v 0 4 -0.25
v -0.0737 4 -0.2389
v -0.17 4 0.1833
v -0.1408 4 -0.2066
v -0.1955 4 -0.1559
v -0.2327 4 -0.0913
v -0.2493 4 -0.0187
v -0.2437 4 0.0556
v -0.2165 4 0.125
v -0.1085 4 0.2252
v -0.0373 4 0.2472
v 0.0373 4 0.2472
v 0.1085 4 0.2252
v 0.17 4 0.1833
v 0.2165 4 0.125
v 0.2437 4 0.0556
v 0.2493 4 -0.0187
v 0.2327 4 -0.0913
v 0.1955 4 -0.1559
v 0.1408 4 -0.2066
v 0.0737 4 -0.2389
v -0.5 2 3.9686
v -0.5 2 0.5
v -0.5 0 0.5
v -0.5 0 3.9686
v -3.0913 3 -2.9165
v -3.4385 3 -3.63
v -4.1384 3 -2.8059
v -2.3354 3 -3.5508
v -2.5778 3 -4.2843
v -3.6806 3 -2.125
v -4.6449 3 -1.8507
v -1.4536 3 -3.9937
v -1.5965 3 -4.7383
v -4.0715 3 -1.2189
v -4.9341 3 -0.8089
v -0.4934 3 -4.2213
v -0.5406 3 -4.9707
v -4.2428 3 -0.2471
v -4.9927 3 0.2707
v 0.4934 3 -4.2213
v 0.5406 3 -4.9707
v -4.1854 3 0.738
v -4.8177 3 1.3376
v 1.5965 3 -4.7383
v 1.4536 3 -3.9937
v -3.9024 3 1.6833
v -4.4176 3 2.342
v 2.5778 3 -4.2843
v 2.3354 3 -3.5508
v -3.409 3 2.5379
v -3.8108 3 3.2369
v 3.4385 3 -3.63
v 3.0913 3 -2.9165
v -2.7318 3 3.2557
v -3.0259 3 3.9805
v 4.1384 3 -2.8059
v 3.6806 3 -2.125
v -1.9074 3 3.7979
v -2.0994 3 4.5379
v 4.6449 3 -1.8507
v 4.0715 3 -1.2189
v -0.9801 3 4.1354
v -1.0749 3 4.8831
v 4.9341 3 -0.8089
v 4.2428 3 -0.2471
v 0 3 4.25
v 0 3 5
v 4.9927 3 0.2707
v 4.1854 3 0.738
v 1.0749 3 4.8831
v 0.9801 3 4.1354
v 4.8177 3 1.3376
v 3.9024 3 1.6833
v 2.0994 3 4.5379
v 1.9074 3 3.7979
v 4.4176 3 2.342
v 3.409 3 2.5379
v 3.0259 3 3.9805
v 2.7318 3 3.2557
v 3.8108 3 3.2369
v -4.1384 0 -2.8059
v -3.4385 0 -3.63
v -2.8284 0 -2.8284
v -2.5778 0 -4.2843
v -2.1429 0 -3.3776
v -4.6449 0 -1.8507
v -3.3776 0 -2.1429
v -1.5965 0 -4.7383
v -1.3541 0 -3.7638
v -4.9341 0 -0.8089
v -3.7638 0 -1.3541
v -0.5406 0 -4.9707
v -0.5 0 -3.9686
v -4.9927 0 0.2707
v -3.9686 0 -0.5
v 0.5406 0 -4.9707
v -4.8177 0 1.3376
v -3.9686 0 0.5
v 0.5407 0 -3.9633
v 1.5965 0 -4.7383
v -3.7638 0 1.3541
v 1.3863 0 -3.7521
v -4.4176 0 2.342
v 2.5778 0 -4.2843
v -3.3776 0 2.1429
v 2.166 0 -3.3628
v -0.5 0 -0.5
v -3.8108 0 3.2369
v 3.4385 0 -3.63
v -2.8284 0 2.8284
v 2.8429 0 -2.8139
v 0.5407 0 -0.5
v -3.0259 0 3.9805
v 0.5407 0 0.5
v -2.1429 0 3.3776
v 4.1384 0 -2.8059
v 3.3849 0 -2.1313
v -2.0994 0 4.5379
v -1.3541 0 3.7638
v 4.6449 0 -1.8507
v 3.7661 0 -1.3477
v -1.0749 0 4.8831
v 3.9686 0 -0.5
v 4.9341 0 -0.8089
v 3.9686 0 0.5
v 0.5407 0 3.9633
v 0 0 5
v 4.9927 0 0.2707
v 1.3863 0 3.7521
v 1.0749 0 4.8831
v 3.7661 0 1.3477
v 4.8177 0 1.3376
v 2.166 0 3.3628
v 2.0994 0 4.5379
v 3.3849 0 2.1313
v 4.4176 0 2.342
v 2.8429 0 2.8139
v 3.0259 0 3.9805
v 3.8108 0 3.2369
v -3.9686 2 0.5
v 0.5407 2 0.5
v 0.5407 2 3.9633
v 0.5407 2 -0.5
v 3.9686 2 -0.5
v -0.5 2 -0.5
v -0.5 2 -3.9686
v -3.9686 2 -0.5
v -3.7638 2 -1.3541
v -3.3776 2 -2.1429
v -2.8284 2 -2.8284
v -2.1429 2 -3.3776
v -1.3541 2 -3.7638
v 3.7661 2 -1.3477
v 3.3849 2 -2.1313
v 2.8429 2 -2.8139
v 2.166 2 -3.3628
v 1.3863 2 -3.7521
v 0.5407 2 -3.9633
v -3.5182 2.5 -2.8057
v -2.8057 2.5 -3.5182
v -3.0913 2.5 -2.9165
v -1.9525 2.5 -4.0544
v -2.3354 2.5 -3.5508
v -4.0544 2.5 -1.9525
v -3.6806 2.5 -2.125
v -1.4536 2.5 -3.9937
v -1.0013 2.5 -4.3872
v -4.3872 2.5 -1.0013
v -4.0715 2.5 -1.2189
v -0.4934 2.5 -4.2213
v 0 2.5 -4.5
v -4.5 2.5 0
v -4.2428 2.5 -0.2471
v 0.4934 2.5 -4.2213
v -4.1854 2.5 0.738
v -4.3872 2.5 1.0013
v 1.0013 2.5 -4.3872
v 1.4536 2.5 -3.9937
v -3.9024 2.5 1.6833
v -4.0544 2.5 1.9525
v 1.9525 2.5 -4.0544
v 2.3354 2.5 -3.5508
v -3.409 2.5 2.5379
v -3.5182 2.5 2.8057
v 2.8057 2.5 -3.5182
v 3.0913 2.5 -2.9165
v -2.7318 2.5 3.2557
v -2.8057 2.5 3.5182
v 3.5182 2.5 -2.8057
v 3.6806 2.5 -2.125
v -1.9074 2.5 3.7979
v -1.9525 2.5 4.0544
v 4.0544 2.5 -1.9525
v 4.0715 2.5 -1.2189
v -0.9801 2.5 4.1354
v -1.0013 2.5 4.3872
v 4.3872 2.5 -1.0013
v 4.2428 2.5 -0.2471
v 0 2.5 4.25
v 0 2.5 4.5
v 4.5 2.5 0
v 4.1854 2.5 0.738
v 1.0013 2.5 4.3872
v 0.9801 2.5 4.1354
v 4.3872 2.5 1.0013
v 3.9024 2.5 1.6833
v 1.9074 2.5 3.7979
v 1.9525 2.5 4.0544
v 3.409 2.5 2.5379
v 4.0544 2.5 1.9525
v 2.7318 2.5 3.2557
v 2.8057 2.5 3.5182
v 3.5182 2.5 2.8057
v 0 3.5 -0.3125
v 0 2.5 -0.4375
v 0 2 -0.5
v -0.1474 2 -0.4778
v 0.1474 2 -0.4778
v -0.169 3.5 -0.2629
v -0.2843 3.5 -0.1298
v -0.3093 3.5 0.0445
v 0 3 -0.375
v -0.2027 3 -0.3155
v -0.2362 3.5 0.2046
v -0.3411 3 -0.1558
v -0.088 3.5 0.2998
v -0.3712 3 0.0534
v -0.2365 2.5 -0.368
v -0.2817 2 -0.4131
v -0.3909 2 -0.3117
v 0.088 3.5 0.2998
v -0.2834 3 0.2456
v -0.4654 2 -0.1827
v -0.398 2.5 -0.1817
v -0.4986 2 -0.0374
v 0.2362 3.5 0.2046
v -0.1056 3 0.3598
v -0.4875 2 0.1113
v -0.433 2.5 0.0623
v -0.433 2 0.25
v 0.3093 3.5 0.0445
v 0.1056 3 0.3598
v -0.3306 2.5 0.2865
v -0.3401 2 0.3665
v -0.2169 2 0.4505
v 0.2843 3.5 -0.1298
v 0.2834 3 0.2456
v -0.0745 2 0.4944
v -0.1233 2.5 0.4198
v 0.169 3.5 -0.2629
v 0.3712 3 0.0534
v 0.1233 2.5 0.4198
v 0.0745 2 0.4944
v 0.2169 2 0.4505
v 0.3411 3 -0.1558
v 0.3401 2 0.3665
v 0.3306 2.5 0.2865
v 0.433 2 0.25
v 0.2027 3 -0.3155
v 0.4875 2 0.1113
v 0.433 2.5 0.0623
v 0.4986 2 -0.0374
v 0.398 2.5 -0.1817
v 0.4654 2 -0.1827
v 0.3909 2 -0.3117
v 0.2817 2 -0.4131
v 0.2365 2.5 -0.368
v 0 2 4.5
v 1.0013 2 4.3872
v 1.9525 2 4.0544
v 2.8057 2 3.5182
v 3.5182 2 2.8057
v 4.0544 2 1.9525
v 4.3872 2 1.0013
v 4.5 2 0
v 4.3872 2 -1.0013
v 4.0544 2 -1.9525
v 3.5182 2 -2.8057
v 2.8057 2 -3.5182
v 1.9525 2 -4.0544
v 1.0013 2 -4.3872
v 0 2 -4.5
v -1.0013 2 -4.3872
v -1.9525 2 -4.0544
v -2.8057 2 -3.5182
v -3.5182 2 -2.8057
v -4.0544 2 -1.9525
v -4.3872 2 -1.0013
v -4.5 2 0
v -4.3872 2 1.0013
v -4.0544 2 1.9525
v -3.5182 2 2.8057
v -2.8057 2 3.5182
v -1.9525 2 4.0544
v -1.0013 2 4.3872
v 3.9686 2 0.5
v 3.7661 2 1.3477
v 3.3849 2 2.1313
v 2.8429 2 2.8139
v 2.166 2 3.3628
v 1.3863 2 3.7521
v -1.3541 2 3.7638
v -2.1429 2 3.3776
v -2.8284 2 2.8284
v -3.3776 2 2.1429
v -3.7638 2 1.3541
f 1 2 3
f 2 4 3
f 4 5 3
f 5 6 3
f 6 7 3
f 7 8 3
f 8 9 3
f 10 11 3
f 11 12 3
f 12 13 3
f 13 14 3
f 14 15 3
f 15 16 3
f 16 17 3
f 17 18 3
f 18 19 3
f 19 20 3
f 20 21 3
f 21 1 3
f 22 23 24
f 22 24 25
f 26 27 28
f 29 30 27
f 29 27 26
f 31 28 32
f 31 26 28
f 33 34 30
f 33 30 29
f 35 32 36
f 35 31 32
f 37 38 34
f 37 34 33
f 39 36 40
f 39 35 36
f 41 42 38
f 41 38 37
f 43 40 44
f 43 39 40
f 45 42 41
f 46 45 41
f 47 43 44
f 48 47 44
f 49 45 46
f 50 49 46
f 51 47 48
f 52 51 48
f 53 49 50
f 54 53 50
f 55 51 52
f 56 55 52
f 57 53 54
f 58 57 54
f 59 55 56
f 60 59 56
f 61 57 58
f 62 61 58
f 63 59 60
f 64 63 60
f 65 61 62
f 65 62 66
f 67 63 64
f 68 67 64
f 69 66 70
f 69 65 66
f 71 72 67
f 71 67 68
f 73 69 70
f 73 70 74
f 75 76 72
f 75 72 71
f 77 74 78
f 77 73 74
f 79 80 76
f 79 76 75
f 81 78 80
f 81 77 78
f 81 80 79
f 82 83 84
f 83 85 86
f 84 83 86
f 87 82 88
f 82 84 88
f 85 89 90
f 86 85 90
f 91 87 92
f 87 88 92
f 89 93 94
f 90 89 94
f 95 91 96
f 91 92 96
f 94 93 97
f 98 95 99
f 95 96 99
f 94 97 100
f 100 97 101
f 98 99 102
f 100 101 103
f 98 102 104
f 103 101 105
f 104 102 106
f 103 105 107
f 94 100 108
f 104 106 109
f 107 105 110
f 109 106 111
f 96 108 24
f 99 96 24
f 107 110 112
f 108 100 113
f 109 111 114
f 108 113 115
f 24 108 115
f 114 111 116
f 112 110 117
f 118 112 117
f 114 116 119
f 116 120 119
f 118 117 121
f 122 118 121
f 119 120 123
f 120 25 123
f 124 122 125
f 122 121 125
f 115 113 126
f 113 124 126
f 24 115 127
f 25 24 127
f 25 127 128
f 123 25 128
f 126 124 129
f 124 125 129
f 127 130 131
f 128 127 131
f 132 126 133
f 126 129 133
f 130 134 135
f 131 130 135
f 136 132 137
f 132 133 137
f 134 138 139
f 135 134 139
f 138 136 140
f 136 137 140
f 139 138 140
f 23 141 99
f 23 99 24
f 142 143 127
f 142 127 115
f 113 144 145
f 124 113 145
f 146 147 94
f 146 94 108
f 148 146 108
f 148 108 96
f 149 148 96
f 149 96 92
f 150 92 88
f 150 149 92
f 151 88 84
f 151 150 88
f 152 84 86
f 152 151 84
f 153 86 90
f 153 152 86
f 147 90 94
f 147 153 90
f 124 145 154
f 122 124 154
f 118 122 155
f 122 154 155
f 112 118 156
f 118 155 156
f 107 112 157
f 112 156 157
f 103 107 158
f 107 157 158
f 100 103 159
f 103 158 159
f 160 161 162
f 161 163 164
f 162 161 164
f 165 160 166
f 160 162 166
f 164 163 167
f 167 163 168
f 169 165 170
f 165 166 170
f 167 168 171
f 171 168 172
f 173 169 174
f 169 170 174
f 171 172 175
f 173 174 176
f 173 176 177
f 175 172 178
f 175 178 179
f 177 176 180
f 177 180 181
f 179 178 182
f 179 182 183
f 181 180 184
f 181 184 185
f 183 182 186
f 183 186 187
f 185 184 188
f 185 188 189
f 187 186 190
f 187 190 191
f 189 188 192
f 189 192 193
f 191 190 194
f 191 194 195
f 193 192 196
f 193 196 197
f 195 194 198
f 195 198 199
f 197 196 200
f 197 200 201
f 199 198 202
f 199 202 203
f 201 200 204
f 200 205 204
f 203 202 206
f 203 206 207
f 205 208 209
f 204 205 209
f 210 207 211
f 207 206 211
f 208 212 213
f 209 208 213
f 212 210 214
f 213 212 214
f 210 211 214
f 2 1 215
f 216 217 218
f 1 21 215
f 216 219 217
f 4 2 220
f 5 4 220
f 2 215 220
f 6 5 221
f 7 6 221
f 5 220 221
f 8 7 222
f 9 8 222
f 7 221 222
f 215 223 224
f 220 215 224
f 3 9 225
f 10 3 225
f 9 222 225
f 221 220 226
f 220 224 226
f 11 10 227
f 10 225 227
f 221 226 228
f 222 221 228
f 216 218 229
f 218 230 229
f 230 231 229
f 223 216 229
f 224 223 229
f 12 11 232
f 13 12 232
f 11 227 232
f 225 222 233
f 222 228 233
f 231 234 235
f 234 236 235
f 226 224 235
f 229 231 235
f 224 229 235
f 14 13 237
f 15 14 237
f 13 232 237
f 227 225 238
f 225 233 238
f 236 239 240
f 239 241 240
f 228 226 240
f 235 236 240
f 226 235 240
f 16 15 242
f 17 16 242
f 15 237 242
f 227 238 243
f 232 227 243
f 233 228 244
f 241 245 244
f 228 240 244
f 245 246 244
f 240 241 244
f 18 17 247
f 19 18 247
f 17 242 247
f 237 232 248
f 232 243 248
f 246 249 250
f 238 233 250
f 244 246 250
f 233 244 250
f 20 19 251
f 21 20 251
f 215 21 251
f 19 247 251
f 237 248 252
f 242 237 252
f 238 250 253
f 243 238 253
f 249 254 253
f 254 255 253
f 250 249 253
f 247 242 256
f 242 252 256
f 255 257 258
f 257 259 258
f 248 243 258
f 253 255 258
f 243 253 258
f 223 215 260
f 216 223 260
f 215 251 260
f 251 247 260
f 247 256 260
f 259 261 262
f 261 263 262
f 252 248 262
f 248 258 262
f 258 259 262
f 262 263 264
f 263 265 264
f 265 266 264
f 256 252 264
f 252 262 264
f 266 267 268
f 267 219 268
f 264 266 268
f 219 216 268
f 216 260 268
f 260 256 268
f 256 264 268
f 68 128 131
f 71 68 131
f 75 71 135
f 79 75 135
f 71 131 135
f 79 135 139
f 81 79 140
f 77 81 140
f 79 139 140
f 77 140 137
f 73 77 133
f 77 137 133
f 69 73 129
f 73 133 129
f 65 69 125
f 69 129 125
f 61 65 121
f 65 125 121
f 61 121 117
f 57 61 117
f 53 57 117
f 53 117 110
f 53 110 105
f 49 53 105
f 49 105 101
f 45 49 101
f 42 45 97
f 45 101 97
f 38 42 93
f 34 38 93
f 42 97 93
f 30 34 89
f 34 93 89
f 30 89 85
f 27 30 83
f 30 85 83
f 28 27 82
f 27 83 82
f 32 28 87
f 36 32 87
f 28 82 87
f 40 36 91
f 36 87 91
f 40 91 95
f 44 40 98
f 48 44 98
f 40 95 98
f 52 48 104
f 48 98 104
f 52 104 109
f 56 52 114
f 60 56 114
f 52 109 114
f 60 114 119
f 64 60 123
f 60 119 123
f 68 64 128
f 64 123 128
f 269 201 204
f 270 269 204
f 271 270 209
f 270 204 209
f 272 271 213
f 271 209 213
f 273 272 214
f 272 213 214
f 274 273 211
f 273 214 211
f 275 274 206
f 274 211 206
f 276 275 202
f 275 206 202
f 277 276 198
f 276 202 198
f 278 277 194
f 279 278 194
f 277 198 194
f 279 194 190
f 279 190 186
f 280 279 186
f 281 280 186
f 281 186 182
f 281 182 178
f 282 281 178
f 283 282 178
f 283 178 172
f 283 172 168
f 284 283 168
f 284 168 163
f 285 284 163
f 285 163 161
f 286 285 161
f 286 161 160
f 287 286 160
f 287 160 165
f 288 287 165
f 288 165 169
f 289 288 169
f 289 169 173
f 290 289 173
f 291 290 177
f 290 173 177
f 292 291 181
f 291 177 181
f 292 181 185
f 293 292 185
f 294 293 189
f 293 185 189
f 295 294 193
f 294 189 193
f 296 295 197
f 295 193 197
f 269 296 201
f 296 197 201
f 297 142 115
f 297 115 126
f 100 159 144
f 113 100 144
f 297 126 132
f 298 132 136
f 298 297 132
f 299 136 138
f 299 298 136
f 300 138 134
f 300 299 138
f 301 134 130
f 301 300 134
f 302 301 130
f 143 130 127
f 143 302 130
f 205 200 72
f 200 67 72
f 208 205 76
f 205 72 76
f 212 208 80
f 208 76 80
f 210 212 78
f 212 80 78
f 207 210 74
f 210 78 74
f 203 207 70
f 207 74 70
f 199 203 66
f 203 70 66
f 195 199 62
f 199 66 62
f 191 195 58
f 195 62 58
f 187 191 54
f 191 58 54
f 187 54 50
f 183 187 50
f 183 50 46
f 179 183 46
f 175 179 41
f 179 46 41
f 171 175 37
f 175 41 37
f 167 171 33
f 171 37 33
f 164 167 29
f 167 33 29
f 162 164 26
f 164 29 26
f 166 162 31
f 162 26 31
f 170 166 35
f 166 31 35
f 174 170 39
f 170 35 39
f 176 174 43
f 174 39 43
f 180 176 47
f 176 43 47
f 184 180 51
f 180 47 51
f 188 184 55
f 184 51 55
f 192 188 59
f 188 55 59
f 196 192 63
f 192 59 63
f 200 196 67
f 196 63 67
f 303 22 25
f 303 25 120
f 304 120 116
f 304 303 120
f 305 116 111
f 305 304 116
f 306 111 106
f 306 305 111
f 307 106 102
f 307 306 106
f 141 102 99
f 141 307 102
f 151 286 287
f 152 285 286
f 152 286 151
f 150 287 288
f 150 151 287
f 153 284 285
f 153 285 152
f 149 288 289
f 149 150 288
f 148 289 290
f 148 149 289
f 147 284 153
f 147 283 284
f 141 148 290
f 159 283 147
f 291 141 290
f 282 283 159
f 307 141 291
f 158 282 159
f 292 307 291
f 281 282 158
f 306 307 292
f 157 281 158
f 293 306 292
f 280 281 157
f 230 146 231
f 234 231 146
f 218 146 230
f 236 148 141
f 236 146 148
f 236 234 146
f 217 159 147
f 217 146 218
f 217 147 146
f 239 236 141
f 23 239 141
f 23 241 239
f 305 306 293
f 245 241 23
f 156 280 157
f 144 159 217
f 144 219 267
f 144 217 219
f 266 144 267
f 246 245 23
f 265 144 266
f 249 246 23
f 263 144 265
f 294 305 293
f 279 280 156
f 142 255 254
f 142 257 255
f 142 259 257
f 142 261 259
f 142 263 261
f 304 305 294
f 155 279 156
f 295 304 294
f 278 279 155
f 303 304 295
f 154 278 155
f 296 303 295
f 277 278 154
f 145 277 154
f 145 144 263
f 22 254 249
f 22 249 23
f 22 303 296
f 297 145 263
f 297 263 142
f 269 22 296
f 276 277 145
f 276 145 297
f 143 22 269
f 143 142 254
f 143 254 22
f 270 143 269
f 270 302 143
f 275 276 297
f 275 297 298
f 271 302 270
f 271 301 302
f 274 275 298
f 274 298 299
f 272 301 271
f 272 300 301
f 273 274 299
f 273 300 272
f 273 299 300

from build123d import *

# Parameters (mm, degrees)
SKETCH1_R           = 5
BOSS_EXTRUDE1_DEPTH = 3
CUT_EXTRUDE1_DEPTH  = 3
SKETCH3_R           = 4.5
CUT_EXTRUDE2_DEPTH  = 1
SKETCH27_W          = 0.25
SKETCH27_H          = 0.5


with BuildPart() as part:
    # Sketch1 → Boss-Extrude1 (new body)
    with BuildSketch(Plane(origin=(0, 0, 0), x_dir=(1, 0, 0), z_dir=(0, 1, 0))):
        with Locations(Location((0, 0, 0), (0, 0, 270))):
            Circle(SKETCH1_R)
    extrude(amount=BOSS_EXTRUDE1_DEPTH)

    # Sketch2 → Cut-Extrude1 (cut)
    with BuildSketch(Plane(origin=(0, 3, 0), x_dir=(1, 0, 0), z_dir=(0, 1, 0))):
        with BuildLine():
            ThreePointArc((3.968626967, 0.5), (2.842920112, 2.813859491), (0.540748653, 3.96328032))
            Line((0.540748653, 3.96328032), (0.540748653, 0.5))
            Line((0.540748653, 0.5), (3.968626967, 0.5))
        make_face()
        with BuildLine():
            Line((-0.5, 3.968626967), (-0.5, 0.5))
            Line((-0.5, 0.5), (-3.968626967, 0.5))
            ThreePointArc((-3.968626967, 0.5), (-2.828427125, 2.828427125), (-0.5, 3.968626967))
        make_face()
        with BuildLine():
            Line((-3.968626967, -0.5), (-0.5, -0.5))
            Line((-0.5, -0.5), (-0.5, -3.968626967))
            ThreePointArc((-0.5, -3.968626967), (-2.828427125, -2.828427125), (-3.968626967, -0.5))
        make_face()
        with BuildLine():
            Line((0.540748653, -3.96328032), (0.540748653, -0.5))
            Line((0.540748653, -0.5), (3.968626967, -0.5))
            ThreePointArc((3.968626967, -0.5), (2.842920112, -2.813859491), (0.540748653, -3.96328032))
        make_face()
    extrude(amount=-CUT_EXTRUDE1_DEPTH, mode=Mode.SUBTRACT)

    # Sketch3 → Cut-Extrude2 (cut)
    with BuildSketch(Plane(origin=(0, 3, 0), x_dir=(1, 0, 0), z_dir=(0, 1, 0))):
        with Locations(Location((0, 0, 0), (0, 0, 270))):
            Circle(SKETCH3_R)
    extrude(amount=-CUT_EXTRUDE2_DEPTH, mode=Mode.SUBTRACT)

    # Sketch22 → Revolve1 (revolve)
    with BuildSketch(Plane.XY, mode=Mode.PRIVATE) as revolve1_sk:
        Polygon((0, 4), (-0.25, 4), (-0.5, 2), (0, 2), align=None)
    revolve(revolve1_sk.sketch.rotate(Axis((0, 0, 0), (0, 1, 0)), 270), axis=Axis((0, 0, 0), (0, 1, 0)))

    # Sketch27 → Revolve2 (revolve)
    with BuildSketch(Plane.XY, mode=Mode.PRIVATE) as revolve2_sk:
        with Locations((-4.375, 2.75)):
            Rectangle(SKETCH27_W, SKETCH27_H)
    revolve(revolve2_sk.sketch.rotate(Axis((0, 2, 0), (0, 1, 0)), 90), axis=Axis((0, 2, 0), (0, 1, 0)))


solid = part.part
